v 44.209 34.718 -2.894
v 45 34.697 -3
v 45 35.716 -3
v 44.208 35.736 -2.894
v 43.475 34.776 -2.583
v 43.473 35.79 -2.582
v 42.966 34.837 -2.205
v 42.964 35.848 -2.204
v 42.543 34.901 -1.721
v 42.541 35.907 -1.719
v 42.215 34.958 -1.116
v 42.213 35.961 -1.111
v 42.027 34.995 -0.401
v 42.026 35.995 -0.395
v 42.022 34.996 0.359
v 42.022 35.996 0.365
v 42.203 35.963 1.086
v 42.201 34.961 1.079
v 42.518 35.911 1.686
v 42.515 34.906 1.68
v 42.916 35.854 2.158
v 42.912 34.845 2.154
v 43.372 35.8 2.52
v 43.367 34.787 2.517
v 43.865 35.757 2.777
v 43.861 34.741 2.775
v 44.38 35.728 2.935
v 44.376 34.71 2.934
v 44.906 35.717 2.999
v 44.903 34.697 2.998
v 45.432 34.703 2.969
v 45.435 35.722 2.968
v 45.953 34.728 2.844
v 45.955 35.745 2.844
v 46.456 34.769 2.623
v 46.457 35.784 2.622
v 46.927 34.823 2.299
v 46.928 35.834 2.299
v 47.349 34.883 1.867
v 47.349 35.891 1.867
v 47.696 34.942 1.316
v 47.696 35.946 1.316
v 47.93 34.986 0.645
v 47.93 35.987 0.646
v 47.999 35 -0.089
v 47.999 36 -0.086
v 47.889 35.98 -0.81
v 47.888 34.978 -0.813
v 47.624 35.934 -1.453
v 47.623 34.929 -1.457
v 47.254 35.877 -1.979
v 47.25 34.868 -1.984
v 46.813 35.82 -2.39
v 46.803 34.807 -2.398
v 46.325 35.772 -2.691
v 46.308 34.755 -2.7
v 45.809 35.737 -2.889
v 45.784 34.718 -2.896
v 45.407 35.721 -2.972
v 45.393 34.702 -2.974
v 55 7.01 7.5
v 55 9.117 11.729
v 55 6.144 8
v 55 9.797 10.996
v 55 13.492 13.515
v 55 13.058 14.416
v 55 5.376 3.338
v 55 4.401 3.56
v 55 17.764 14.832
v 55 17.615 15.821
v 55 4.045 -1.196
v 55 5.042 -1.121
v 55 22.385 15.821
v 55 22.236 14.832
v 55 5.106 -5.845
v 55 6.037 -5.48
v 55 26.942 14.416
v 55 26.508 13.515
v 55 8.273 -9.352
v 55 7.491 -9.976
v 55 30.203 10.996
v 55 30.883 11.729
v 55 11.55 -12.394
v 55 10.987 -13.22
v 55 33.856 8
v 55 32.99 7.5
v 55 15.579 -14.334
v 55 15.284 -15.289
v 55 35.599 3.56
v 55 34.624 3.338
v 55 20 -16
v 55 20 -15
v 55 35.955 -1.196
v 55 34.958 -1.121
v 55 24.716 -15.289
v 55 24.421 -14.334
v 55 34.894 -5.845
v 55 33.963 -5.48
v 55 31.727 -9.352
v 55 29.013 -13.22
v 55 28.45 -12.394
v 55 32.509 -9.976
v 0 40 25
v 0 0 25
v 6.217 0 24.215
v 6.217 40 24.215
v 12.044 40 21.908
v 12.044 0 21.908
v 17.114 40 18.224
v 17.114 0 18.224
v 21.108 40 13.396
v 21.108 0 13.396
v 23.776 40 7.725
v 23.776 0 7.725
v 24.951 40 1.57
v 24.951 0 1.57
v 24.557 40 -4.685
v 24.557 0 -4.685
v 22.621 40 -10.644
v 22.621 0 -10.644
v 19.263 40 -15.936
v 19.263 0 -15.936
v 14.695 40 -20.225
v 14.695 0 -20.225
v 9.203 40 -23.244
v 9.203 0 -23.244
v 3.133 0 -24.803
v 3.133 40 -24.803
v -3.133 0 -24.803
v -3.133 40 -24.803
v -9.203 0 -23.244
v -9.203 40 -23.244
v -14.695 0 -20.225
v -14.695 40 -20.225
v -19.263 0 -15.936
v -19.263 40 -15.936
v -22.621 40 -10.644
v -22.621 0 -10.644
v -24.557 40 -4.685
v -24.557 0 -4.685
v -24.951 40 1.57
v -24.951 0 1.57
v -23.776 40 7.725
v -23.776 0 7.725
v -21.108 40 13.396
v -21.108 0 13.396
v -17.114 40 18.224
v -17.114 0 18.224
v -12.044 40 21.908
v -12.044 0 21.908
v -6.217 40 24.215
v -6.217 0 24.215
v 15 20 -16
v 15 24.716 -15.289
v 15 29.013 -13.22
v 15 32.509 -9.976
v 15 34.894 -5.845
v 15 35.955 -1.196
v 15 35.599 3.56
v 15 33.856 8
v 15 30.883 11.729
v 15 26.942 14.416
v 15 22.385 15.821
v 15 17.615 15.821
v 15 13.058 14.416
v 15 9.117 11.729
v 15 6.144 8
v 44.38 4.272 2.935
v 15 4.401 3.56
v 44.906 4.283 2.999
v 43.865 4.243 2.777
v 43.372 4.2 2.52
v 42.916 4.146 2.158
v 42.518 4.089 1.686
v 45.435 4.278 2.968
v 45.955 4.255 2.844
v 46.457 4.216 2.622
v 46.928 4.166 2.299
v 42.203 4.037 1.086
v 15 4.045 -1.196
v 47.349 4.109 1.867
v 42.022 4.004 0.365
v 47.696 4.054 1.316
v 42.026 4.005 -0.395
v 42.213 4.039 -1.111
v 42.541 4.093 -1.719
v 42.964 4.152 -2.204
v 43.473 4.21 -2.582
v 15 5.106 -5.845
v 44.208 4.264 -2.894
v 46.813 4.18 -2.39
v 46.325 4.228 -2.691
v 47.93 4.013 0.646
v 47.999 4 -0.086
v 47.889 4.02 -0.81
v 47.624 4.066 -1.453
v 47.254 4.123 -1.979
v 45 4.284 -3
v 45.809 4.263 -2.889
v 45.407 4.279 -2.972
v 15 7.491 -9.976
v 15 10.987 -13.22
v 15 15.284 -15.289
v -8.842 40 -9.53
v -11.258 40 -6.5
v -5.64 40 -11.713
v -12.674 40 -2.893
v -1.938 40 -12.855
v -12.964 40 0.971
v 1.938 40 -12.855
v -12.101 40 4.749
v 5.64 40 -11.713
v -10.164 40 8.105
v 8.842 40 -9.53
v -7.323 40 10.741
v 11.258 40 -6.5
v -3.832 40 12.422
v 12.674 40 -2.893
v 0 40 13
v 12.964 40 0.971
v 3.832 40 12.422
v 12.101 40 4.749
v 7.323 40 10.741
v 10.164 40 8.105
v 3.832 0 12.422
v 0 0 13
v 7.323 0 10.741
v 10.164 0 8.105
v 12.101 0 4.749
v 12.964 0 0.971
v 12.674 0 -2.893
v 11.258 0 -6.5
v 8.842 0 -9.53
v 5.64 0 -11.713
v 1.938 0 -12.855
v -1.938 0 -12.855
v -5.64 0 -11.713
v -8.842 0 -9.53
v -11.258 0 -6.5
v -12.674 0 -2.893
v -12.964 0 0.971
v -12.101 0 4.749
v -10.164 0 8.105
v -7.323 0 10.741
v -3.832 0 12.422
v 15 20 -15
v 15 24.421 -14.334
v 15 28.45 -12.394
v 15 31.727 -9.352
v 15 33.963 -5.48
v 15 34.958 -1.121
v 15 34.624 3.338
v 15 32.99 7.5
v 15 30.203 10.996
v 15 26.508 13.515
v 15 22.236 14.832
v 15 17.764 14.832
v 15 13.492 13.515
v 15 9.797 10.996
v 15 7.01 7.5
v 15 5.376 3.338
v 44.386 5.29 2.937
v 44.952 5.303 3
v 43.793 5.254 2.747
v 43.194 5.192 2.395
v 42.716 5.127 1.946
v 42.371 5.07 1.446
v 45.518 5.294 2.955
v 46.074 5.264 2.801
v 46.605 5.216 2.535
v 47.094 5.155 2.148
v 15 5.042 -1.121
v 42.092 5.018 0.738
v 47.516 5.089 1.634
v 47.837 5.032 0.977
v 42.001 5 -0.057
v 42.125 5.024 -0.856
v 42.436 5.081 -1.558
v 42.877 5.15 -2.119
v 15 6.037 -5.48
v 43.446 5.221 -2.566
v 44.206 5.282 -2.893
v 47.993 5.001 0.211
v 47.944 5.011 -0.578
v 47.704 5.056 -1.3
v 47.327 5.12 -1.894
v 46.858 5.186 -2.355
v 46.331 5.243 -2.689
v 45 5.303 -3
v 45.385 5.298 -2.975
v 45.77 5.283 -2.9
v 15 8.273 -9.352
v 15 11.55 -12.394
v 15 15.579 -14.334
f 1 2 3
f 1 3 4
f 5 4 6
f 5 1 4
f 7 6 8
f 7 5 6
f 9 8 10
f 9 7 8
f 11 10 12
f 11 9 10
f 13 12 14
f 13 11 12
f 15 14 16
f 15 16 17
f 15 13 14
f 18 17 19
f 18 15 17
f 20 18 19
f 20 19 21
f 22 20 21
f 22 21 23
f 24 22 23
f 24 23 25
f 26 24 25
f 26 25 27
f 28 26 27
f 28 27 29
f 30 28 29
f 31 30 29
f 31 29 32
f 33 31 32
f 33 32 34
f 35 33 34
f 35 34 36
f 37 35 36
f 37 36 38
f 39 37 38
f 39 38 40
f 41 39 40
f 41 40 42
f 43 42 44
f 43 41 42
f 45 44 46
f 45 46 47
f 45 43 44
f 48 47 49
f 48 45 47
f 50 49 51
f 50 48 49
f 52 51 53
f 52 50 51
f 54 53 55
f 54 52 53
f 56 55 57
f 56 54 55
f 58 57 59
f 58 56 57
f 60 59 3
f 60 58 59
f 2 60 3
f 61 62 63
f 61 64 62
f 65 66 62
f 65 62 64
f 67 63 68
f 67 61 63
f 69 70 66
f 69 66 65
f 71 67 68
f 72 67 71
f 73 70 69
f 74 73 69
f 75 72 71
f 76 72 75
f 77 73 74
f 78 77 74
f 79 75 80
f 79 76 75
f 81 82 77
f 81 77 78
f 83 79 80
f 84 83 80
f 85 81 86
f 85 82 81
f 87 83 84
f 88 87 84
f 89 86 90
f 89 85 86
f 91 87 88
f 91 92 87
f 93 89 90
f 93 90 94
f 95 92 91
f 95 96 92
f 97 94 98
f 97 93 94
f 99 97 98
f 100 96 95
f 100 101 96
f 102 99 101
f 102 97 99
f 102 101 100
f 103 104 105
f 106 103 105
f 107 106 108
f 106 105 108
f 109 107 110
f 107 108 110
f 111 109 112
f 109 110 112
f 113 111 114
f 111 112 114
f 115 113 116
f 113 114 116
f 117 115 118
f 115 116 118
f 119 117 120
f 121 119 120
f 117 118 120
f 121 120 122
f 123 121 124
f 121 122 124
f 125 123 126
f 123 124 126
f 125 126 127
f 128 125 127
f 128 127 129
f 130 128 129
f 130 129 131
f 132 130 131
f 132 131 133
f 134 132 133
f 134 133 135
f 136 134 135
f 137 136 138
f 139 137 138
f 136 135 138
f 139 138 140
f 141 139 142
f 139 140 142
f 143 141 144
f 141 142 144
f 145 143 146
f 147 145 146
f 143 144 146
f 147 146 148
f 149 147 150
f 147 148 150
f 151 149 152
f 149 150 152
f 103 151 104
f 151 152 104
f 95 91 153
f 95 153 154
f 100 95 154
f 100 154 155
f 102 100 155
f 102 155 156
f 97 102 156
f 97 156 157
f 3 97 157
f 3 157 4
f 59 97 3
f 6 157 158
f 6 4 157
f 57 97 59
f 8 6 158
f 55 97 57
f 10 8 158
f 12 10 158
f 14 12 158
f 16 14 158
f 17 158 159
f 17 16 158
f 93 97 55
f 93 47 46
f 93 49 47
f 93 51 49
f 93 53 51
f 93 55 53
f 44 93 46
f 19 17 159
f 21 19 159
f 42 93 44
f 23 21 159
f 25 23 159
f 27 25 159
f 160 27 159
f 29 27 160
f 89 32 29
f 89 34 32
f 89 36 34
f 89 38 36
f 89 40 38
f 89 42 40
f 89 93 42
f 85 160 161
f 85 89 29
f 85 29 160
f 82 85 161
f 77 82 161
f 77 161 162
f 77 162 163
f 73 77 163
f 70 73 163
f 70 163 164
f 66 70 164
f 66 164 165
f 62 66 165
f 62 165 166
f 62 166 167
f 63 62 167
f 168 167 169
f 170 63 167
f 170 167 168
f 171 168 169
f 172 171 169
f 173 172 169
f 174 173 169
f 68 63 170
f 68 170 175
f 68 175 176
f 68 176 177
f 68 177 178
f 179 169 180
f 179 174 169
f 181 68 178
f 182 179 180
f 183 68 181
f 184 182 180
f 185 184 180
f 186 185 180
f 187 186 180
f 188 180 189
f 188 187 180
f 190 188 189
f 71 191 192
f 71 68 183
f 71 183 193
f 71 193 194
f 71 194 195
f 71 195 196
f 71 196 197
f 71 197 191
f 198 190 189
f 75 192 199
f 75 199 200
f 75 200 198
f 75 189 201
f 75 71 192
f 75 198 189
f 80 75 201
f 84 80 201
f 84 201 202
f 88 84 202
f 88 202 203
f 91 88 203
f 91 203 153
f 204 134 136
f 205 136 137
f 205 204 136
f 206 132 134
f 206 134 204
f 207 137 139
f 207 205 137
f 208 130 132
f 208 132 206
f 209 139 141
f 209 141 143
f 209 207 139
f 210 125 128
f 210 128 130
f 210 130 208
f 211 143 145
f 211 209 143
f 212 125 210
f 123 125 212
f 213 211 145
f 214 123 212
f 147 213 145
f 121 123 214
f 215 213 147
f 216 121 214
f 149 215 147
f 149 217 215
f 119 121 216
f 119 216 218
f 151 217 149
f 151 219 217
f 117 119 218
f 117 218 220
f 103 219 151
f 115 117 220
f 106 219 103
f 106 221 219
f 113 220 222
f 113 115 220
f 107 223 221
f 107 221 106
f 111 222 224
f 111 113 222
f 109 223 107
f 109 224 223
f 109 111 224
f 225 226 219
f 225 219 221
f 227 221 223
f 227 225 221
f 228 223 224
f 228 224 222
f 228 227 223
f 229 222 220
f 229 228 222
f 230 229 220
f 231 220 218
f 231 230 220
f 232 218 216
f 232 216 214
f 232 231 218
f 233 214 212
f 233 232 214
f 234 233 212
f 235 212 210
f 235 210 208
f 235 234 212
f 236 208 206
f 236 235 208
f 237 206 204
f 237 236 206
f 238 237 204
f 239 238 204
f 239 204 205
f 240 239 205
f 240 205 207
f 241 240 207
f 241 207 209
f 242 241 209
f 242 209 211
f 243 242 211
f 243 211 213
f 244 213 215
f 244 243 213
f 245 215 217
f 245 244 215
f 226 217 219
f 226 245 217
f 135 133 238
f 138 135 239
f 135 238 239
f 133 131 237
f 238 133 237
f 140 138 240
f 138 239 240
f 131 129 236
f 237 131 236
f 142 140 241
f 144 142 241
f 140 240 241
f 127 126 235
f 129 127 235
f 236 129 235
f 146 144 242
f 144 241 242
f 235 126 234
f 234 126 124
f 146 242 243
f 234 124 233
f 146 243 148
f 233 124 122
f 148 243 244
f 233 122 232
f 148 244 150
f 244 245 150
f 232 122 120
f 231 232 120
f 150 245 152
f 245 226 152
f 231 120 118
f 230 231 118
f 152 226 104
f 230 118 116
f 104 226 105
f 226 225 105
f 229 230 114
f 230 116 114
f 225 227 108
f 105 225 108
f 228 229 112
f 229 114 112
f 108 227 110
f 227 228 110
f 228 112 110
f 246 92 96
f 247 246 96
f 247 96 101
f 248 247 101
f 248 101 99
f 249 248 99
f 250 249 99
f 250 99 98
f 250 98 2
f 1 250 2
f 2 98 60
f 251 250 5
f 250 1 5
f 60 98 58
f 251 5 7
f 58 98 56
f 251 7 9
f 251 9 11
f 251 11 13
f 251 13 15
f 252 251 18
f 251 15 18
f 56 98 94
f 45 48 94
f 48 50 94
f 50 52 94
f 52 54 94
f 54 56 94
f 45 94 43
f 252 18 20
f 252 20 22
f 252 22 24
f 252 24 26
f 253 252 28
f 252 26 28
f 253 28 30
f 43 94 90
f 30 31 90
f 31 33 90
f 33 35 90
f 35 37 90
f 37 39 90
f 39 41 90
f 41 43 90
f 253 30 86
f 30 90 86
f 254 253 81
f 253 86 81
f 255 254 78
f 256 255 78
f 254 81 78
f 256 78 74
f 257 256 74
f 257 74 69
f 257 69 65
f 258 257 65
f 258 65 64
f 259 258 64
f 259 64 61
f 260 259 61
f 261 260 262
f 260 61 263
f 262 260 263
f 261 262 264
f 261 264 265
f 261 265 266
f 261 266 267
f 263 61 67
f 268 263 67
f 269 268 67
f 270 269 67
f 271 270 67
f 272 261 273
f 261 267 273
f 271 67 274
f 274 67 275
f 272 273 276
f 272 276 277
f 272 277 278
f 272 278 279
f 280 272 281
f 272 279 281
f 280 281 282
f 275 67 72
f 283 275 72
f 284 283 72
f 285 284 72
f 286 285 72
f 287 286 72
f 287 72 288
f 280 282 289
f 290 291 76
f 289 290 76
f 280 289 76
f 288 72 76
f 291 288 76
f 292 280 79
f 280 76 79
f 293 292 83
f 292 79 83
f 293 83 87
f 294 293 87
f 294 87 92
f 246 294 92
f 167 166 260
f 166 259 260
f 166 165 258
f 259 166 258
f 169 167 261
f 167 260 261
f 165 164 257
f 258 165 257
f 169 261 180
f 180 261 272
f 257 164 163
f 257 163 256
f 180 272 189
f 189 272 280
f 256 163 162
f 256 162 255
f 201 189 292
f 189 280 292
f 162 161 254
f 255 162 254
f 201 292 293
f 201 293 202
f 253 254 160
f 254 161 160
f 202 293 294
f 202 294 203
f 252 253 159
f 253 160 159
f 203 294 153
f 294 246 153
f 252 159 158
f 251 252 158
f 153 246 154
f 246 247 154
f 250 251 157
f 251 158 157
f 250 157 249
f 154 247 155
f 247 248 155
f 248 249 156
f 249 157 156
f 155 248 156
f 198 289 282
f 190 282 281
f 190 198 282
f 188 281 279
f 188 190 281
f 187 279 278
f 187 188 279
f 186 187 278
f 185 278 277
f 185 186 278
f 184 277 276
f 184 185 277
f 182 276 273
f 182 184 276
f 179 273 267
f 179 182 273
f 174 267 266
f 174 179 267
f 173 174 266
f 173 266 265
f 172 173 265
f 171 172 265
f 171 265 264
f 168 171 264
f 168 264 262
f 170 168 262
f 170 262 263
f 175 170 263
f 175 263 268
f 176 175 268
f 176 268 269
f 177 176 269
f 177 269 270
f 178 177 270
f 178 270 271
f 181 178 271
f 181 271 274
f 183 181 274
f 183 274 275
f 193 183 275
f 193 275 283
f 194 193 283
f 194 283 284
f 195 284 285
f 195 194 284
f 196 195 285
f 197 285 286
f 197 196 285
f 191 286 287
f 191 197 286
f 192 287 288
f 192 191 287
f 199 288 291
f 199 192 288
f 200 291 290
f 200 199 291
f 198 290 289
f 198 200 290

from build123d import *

# Parameters (mm, degrees)
SKETCH1_R           = 25
SKETCH1_R_2         = 13
BOSS_EXTRUDE1_DEPTH = 40
SKETCH2_R           = 16
SKETCH2_R_2         = 15
BOSS_EXTRUDE2_DEPTH = 40
SKETCH3_R           = 3
CUT_EXTRUDE1_DEPTH  = 39


with BuildPart() as part:
    # Sketch1 → Boss-Extrude1 (new body)
    with BuildSketch(Plane(origin=(0, 0, 0), x_dir=(1, 0, 0), z_dir=(0, 1, 0))):
        with Locations(Location((0, 0, 0), (0, 0, 270))):
            Circle(SKETCH1_R)
        with Locations(Location((0, 0, 0), (0, 0, 270))):
            Circle(SKETCH1_R_2, mode=Mode.SUBTRACT)
    extrude(amount=BOSS_EXTRUDE1_DEPTH)


with BuildPart() as body_2:
    # Sketch2 → Boss-Extrude2 (new body)
    with BuildSketch(Plane(origin=(55, 0, 0), x_dir=(0, 0, -1), z_dir=(1, 0, 0))):
        with Locations((0, 20)):
            Circle(SKETCH2_R)
        with Locations((0, 20)):
            Circle(SKETCH2_R_2, mode=Mode.SUBTRACT)
    extrude(amount=-BOSS_EXTRUDE2_DEPTH)

    # Sketch3 → Cut-Extrude1 (cut)
    with BuildSketch(Plane(origin=(0, 0, 0), x_dir=(1, 0, 0), z_dir=(0, 1, 0))):
        with Locations(Location((45, 0, 0), (0, 0, 90))):
            Circle(SKETCH3_R)
    extrude(amount=CUT_EXTRUDE1_DEPTH, mode=Mode.SUBTRACT)


solid = Compound([part.part, body_2.part])
